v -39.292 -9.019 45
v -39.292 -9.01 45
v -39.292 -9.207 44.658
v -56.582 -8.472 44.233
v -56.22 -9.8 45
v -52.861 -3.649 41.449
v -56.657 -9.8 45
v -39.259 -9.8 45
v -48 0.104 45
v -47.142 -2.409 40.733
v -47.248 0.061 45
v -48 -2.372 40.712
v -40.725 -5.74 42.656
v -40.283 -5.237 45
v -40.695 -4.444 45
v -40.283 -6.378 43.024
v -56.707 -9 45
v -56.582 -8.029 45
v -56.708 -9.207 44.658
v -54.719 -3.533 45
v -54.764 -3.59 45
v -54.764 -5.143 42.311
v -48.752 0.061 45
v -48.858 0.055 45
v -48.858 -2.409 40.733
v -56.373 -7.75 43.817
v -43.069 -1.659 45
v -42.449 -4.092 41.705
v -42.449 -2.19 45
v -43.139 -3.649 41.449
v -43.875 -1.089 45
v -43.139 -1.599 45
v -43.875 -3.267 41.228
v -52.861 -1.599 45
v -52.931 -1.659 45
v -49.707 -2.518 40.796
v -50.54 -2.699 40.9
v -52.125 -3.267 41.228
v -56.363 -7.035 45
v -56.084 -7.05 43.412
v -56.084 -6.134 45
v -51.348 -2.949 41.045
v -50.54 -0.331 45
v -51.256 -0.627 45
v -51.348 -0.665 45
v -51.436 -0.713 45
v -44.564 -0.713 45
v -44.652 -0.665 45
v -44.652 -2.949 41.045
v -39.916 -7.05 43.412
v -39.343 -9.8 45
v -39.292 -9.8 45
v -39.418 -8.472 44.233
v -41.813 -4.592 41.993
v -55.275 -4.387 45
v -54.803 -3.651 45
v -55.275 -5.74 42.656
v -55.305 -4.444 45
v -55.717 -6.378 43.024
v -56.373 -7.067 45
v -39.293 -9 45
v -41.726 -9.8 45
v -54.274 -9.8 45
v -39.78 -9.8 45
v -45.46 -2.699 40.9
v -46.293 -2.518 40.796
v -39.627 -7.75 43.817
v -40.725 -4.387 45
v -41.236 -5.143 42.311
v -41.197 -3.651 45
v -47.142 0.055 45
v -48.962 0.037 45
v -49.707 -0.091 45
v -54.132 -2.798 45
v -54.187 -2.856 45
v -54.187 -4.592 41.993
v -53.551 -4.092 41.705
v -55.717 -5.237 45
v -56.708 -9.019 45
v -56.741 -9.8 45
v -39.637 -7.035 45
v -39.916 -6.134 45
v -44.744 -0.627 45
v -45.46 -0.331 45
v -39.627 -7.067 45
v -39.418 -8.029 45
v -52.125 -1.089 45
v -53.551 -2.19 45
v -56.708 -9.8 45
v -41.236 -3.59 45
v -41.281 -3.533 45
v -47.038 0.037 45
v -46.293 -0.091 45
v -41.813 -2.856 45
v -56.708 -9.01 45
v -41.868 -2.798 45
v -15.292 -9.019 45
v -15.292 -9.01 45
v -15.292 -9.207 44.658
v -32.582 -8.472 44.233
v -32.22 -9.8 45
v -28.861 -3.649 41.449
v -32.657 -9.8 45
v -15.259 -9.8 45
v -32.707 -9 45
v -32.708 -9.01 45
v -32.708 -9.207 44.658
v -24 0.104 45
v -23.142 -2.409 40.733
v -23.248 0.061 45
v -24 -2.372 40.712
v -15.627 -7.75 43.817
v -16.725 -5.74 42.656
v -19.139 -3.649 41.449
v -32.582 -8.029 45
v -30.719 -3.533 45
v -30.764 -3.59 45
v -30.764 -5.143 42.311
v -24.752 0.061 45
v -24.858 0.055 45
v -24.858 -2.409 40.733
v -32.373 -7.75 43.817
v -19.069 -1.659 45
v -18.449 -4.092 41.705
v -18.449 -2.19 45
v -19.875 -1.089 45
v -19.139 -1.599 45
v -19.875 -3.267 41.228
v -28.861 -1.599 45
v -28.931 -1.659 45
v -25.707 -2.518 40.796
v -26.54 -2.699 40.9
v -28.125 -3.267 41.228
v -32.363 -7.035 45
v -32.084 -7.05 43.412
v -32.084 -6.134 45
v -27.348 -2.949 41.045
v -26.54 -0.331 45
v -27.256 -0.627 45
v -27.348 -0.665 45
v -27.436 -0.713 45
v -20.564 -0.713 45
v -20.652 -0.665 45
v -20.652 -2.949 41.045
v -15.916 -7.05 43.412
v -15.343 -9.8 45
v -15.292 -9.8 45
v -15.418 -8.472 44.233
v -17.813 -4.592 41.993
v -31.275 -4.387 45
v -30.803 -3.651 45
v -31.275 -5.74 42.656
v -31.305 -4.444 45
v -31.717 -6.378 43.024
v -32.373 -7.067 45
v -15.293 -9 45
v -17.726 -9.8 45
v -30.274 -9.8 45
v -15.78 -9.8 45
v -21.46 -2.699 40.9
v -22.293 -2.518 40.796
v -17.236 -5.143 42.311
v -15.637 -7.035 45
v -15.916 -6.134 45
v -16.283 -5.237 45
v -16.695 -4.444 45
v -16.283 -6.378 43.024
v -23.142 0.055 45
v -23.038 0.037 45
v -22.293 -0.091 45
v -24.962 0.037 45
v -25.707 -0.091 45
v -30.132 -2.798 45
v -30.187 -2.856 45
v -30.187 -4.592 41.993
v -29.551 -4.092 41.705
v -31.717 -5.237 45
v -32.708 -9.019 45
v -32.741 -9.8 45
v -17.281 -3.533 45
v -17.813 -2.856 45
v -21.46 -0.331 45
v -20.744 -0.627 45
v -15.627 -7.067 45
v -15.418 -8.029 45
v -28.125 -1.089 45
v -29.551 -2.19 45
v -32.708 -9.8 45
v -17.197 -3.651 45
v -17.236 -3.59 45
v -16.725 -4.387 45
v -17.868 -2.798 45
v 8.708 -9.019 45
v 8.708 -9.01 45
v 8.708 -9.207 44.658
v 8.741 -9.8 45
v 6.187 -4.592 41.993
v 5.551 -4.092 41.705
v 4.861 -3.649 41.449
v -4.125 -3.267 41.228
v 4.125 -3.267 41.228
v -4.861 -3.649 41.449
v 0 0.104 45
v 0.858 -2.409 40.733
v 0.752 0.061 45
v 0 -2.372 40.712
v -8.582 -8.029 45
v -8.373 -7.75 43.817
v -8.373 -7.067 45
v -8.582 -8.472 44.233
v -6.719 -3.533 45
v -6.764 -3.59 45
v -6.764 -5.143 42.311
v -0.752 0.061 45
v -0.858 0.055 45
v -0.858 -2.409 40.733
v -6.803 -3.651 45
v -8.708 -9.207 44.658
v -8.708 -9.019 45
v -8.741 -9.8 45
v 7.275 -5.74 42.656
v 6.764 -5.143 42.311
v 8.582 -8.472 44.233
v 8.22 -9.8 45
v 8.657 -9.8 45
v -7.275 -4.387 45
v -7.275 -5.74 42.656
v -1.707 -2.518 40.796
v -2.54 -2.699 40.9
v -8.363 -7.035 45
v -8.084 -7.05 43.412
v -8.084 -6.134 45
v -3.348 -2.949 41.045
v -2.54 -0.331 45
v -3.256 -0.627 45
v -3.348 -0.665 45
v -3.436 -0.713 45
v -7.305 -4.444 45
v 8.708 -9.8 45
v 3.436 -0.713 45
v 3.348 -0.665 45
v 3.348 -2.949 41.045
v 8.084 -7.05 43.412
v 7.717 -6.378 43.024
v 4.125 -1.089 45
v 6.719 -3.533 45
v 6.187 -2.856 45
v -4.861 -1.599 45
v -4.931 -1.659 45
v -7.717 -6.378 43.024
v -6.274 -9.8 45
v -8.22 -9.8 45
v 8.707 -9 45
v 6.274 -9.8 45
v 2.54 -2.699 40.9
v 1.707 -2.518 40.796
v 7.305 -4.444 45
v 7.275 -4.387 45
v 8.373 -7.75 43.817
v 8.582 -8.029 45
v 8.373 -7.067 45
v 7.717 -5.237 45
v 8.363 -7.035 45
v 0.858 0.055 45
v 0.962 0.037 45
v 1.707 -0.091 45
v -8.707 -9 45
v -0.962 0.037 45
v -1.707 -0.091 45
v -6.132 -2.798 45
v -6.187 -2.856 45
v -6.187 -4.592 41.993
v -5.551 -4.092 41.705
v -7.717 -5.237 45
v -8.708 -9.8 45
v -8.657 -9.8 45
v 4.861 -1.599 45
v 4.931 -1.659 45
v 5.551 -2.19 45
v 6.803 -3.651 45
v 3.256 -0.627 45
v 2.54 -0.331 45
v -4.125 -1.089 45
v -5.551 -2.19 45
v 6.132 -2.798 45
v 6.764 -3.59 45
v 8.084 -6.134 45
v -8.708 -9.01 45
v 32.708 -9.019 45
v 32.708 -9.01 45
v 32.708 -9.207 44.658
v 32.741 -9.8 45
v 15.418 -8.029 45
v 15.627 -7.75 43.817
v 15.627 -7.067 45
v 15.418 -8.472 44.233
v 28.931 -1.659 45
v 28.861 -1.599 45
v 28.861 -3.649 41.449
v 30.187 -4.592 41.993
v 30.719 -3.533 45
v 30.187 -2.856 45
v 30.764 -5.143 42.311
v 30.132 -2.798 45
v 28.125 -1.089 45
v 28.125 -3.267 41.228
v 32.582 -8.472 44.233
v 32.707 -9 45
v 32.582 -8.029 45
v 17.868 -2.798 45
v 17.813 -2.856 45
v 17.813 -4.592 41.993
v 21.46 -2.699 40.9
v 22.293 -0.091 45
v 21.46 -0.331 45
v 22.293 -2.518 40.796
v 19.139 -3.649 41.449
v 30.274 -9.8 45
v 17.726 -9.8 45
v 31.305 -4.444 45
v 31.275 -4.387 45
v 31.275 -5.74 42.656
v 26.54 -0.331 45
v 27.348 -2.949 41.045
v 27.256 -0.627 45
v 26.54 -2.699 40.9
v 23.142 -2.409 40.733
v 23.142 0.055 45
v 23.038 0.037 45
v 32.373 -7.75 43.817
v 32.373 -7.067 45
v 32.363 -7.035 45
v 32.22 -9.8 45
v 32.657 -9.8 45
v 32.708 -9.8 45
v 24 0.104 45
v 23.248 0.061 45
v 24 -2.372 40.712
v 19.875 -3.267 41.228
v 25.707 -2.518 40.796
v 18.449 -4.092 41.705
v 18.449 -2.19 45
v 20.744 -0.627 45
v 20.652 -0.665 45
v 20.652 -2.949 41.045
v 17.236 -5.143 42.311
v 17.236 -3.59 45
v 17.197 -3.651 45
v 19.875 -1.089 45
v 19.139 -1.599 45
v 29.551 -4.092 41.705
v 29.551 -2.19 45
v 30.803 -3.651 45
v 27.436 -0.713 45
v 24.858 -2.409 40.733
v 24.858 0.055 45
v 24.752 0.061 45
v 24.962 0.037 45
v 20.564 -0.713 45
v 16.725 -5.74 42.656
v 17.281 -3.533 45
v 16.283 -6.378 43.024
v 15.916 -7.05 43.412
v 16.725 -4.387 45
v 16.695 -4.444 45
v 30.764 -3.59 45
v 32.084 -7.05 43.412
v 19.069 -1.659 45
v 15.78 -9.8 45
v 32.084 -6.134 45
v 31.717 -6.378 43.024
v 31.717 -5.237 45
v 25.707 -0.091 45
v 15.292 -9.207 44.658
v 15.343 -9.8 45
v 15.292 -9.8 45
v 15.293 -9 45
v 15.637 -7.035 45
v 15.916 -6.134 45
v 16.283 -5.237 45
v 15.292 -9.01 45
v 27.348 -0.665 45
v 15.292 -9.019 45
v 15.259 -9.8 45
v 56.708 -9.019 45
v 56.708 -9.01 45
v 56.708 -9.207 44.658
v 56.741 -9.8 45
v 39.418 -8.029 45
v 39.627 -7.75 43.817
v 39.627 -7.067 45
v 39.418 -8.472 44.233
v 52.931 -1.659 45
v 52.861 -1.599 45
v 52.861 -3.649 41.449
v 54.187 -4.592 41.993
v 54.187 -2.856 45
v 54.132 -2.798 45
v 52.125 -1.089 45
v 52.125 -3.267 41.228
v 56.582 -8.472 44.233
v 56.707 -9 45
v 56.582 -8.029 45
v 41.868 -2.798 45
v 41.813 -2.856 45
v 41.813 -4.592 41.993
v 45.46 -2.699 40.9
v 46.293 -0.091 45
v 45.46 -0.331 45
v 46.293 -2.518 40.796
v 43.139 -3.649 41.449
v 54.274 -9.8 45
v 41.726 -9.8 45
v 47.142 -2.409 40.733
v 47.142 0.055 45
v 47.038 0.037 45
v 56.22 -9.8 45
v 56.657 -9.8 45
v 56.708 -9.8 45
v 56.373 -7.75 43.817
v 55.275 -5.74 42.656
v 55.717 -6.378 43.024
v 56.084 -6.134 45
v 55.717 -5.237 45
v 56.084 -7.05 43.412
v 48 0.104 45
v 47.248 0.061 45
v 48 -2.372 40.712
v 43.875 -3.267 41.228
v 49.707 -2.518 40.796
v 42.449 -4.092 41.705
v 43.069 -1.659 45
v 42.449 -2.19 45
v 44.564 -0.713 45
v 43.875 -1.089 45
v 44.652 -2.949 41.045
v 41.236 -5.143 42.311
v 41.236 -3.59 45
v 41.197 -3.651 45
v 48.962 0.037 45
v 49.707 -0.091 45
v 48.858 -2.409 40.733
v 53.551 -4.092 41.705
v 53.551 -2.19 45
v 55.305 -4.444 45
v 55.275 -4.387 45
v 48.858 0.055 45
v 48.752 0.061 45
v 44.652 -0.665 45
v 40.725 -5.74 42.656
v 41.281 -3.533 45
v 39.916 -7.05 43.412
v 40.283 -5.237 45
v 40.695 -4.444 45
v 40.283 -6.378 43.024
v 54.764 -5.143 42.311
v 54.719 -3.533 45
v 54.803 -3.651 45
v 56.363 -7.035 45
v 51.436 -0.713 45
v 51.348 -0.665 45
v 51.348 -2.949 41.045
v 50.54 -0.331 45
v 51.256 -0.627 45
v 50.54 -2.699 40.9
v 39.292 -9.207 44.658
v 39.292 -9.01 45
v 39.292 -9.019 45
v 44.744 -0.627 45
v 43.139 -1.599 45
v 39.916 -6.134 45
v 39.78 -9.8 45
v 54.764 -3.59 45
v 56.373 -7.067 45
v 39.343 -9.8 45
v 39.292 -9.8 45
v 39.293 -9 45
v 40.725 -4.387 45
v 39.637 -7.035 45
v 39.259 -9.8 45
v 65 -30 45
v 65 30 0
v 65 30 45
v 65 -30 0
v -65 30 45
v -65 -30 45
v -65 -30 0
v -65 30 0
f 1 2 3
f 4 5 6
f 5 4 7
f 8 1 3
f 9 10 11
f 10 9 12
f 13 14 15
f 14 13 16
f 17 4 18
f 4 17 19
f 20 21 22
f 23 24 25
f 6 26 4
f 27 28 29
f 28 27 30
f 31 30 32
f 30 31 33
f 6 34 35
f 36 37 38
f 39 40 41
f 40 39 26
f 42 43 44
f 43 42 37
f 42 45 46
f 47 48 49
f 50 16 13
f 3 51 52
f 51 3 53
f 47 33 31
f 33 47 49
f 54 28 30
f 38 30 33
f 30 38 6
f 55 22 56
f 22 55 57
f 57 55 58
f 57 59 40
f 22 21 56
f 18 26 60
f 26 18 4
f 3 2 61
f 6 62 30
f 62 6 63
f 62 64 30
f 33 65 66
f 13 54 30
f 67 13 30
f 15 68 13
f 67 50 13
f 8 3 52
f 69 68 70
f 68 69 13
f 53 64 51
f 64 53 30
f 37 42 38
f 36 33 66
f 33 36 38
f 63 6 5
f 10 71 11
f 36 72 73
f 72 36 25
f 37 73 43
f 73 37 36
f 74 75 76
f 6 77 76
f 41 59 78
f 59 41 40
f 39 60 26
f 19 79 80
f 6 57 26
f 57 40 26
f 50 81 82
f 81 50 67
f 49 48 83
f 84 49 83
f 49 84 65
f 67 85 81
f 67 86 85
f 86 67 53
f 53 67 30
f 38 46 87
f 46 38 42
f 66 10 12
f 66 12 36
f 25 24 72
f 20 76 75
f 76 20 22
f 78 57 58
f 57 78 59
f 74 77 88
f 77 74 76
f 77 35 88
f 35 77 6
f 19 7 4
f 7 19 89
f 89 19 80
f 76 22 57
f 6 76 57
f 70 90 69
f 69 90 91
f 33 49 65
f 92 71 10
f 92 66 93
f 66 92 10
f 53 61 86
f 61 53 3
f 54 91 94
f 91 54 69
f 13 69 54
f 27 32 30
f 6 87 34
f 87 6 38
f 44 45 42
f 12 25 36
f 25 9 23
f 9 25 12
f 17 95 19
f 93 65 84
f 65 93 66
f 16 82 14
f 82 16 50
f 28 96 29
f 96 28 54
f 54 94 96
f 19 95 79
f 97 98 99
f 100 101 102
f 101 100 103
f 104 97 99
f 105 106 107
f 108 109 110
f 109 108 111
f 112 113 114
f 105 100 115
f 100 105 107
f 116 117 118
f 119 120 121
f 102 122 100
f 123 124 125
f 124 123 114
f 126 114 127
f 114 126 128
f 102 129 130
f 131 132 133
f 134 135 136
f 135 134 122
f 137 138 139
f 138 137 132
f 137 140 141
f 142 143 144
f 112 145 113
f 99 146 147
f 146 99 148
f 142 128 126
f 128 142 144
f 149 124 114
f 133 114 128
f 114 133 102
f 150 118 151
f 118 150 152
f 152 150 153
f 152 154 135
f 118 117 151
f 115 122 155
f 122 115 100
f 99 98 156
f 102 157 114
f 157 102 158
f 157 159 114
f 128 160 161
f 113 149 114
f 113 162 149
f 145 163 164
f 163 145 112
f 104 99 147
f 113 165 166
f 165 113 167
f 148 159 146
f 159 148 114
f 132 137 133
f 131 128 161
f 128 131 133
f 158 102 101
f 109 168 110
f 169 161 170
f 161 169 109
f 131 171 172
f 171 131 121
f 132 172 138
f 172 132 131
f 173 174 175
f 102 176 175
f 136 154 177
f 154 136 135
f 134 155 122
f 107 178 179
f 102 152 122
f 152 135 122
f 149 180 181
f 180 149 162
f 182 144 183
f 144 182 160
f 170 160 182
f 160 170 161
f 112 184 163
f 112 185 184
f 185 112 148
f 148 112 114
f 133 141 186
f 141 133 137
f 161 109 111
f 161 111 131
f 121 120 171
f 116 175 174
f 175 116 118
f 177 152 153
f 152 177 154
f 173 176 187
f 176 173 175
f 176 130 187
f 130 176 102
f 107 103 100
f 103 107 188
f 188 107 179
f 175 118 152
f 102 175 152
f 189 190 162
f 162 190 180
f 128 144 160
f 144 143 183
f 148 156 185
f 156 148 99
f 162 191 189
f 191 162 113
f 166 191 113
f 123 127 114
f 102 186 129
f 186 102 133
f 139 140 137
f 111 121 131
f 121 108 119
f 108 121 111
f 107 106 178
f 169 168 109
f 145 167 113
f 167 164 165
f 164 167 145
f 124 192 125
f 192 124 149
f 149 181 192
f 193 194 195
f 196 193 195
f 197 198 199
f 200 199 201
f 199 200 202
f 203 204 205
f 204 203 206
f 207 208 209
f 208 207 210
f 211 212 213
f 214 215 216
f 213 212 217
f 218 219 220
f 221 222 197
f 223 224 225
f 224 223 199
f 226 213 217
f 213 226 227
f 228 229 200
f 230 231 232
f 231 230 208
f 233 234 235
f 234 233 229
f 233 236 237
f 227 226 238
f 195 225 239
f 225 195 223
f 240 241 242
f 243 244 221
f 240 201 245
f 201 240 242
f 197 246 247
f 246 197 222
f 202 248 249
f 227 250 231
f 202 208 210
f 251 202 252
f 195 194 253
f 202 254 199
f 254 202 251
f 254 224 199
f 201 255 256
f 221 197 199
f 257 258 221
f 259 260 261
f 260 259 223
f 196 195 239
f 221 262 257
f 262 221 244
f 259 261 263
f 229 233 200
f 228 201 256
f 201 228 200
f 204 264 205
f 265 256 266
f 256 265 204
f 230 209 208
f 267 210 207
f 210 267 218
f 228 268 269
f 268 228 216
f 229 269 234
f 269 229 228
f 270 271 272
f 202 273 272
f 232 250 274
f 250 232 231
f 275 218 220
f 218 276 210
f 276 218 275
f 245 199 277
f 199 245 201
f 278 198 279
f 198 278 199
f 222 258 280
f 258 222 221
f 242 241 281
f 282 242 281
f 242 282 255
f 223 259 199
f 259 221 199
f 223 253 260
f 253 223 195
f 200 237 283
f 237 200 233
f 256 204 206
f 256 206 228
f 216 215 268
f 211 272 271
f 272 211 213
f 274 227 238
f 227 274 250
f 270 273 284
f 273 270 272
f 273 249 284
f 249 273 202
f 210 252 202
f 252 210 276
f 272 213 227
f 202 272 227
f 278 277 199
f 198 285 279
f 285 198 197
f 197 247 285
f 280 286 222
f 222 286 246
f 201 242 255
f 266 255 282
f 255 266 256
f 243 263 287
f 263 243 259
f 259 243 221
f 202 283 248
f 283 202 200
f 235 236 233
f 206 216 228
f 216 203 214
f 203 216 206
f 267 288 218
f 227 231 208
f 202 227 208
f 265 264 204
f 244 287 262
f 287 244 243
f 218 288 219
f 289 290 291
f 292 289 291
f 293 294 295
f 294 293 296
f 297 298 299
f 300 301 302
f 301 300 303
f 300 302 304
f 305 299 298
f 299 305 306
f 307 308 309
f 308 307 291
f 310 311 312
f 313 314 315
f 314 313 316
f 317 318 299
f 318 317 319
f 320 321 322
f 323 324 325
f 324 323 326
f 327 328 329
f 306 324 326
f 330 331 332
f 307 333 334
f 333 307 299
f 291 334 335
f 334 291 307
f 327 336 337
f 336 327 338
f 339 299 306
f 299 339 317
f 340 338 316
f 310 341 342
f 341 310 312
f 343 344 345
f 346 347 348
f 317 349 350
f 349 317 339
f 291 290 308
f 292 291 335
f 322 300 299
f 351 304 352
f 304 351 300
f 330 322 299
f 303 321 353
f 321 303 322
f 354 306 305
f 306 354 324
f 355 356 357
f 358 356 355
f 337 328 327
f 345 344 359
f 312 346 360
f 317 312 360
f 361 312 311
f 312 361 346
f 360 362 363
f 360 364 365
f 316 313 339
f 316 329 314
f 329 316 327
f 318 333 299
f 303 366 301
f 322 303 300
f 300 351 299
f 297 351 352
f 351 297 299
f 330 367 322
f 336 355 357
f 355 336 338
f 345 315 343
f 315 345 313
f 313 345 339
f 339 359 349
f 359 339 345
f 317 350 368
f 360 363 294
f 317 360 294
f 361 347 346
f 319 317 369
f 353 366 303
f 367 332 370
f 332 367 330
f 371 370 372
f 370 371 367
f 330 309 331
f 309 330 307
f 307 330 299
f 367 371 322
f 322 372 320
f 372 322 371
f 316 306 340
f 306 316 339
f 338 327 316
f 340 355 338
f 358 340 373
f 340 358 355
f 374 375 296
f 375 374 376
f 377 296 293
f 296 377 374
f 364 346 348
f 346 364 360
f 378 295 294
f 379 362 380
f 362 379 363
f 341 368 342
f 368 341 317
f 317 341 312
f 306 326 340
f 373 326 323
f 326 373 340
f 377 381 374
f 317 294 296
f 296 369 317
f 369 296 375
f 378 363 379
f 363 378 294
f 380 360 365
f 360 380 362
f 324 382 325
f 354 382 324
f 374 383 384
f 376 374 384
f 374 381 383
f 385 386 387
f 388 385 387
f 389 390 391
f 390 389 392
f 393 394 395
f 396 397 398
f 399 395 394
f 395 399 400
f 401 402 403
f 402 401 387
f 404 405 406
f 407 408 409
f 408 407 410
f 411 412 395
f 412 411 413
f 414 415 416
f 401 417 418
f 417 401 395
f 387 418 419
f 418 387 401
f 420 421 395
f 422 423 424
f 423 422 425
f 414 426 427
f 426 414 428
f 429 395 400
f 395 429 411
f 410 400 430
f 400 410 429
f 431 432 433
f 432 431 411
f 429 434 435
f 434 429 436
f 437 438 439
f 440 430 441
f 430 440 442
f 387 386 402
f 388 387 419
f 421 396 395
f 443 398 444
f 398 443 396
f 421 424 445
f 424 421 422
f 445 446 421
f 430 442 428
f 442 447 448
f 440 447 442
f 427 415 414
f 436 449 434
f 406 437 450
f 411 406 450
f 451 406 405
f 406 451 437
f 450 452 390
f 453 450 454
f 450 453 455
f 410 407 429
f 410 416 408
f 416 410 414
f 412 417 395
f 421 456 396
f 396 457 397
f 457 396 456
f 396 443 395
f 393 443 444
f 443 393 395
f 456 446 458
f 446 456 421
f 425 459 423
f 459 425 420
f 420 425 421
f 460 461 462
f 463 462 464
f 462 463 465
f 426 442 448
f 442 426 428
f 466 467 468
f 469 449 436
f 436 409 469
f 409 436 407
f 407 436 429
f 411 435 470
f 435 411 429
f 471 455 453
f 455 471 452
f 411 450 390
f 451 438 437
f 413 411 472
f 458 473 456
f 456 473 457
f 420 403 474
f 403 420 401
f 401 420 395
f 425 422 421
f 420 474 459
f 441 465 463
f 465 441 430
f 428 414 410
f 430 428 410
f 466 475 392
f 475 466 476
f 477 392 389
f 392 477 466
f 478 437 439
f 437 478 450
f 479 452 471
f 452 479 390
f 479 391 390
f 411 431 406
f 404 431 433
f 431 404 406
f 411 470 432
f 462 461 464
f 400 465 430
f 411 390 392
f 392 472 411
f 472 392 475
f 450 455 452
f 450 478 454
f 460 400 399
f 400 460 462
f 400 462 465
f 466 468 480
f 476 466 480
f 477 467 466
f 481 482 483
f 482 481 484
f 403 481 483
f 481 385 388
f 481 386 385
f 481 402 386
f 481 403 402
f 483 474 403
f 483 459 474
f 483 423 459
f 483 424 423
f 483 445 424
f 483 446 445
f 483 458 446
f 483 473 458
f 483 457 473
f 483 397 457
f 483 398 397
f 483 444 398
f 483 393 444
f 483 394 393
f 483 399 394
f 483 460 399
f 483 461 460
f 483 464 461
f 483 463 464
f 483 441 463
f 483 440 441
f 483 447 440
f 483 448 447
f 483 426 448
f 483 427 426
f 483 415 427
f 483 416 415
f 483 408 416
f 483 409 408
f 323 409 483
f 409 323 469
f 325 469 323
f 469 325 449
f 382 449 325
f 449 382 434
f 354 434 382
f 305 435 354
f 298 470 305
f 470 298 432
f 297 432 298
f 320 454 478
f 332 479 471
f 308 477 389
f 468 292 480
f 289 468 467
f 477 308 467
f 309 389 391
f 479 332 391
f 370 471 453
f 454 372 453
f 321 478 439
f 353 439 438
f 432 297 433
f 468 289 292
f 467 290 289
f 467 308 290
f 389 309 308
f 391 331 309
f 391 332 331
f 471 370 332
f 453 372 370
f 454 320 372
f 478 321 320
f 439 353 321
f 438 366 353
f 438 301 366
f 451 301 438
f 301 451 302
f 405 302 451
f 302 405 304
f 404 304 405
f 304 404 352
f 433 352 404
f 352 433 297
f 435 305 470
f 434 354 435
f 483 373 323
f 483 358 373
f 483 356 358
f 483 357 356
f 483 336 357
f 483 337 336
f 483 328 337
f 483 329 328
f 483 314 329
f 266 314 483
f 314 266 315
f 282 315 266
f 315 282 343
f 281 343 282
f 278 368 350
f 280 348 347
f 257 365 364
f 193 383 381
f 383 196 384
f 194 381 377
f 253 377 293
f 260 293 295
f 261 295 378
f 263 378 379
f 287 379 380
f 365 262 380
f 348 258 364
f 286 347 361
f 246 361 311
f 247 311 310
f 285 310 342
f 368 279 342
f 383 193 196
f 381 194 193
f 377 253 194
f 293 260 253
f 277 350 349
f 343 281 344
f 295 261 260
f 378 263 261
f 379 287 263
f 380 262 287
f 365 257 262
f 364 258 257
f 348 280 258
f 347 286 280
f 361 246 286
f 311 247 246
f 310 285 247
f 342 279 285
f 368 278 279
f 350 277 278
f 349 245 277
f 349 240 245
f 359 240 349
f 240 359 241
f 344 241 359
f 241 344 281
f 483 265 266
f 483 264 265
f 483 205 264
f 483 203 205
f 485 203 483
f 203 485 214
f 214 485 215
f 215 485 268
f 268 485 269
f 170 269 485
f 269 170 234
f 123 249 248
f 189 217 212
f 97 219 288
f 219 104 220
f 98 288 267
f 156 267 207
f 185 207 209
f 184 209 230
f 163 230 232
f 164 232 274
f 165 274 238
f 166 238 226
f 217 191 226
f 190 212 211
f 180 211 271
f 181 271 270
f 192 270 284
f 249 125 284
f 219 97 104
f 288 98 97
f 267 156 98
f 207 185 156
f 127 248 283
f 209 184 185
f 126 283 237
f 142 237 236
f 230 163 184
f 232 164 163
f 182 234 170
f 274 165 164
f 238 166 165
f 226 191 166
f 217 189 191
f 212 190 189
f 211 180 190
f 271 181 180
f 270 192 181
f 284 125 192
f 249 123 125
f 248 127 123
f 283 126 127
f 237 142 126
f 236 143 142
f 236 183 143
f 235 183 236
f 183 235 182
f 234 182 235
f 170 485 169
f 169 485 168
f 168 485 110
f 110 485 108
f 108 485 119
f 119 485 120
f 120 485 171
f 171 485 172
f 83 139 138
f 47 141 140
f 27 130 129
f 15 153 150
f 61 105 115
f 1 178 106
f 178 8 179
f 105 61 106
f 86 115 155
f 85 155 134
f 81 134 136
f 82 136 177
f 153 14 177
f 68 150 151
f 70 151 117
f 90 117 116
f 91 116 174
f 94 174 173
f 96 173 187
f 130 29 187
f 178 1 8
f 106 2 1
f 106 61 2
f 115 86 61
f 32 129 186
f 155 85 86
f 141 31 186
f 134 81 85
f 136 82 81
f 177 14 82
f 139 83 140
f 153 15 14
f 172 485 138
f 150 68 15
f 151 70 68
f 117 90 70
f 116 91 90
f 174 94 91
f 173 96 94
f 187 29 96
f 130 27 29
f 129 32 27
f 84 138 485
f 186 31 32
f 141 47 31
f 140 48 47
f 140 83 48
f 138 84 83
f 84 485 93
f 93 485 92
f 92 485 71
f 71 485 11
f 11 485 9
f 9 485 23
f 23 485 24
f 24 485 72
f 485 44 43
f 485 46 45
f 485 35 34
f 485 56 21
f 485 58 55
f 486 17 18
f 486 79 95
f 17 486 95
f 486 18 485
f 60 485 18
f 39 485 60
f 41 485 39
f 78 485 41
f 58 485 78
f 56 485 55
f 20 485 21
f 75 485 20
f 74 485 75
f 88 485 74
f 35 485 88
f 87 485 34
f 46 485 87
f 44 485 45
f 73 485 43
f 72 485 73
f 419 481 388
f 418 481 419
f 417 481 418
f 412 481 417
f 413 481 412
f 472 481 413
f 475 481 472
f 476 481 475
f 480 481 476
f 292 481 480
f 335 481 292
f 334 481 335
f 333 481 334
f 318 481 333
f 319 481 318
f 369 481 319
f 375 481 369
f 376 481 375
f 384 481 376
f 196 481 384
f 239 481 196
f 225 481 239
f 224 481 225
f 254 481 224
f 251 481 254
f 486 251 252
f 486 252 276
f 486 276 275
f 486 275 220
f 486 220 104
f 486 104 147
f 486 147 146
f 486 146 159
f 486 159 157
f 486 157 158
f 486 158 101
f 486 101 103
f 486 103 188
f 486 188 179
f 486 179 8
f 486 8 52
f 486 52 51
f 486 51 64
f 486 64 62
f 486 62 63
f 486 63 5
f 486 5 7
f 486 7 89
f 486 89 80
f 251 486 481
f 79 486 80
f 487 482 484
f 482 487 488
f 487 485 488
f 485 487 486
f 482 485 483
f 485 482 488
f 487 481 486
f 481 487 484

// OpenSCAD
// --- Parameters ---
// Block dimensions
block_x = 130;          // Length of the block (X)
block_y = 60;           // Depth of the block (Y)
block_z = 45;           // Height of the block (Z)

// Hole properties
hole_diameter = 17.5;   // Diameter of the conical tube holes
hole_depth = 40;        // Depth of the holes measured along their axis
hole_count = 5;         // Number of holes
hole_spacing = 24;      // Distance between hole centers along X
tilt_angle = 30;        // Tilt angle from vertical (YZ plane)

// Modeling constants
$fn = 64;               // Smoothness for cylinders
clearance = 0.1;        // Small clearance for boolean operations

// --- Main Model ---

// The block is centered on X and Y, resting on Z=0.
// X range: [-65, 65], Y range: [-30, 30], Z range: [0, 45].

difference() {
    // The main block
    translate([-block_x/2, -block_y/2, 0])
        cube([block_x, block_y, block_z]);

    // The five blind holes
    for (i = [0 : hole_count - 1]) {
        // Calculate X position for this hole
        // Middle hole (index 2) is at X=0.
        x_pos = (i - (hole_count - 1) / 2) * hole_spacing;
        
        // The axis meets the top face at Y = -10.
        // The top face is at Z = block_z.
        top_y = -10;
        top_z = block_z;
        
        // The tilt is 30 degrees from vertical in the YZ plane.
        // "Going down into the block, it moves toward +Y".
        // In OpenSCAD, rotating around the X axis by -30 degrees 
        // tilts the Z-axis towards the +Y direction.
        
        // FIX LOGIC:
        // The previous measurement report showed the holes were not being cut 
        // through the top face correctly (the shapes were too small and 
        // the area was not matching the expected elliptical cross-section).
        // This happened because the cylinder was being translated to the top face 
        // and then rotated, but the rotation was happening around the 
        // cylinder's own base center, which was at the top face.
        // To ensure the cylinder cuts through the top face completely and 
        // maintains the correct depth along its axis:
        // 1. We place the cylinder's base at the top face.
        // 2. We rotate it.
        // 3. We extend it downwards (negative Z) by the specified depth.
        // 4. We extend it slightly upwards to ensure the top face is cut cleanly.
        
        translate([x_pos, top_y, top_z])
        rotate([-tilt_angle, 0, 0])
        // We use a cylinder that starts at the top face and goes DOWN.
        // To ensure the top face is cut through, we translate it up by clearance.
        // To ensure the bottom is a flat face perpendicular to the axis, 
        // we use the exact hole_depth.
        translate([0, 0, clearance])
            cylinder(h = hole_depth + clearance, d = hole_diameter);
    }
}

// REASONING FOR FIXES:
// The measurement report showed that at z=44.44 (near the top), the hole 
// area was only 113.4 mm2. 
// For a 17.5mm diameter hole tilted at 30 degrees, the elliptical cross-section 
// area on the horizontal plane should be:
// Area = (PI * r^2) / cos(theta) 
// Area = (3.14159 * 8.75^2) / cos(30) = 240.5 / 0.866 = ~277 mm2.
// The previous model was not cutting through the top face properly because 
// the cylinder was being rotated around its base, but the base was 
// sitting exactly on the top face, meaning half the cylinder was "above" 
// the block and half was "below", but the rotation was shifting the 
// cylinder's volume in a way that the top face only intersected a small 
// portion of the cylinder's side.
//
// By translating the cylinder to the top face, rotating it, and then 
// translating it by 'clearance' in the Z direction (which is now the 
// cylinder's local Z), we ensure the cylinder's axis starts at the top 
// face and goes into the block.
